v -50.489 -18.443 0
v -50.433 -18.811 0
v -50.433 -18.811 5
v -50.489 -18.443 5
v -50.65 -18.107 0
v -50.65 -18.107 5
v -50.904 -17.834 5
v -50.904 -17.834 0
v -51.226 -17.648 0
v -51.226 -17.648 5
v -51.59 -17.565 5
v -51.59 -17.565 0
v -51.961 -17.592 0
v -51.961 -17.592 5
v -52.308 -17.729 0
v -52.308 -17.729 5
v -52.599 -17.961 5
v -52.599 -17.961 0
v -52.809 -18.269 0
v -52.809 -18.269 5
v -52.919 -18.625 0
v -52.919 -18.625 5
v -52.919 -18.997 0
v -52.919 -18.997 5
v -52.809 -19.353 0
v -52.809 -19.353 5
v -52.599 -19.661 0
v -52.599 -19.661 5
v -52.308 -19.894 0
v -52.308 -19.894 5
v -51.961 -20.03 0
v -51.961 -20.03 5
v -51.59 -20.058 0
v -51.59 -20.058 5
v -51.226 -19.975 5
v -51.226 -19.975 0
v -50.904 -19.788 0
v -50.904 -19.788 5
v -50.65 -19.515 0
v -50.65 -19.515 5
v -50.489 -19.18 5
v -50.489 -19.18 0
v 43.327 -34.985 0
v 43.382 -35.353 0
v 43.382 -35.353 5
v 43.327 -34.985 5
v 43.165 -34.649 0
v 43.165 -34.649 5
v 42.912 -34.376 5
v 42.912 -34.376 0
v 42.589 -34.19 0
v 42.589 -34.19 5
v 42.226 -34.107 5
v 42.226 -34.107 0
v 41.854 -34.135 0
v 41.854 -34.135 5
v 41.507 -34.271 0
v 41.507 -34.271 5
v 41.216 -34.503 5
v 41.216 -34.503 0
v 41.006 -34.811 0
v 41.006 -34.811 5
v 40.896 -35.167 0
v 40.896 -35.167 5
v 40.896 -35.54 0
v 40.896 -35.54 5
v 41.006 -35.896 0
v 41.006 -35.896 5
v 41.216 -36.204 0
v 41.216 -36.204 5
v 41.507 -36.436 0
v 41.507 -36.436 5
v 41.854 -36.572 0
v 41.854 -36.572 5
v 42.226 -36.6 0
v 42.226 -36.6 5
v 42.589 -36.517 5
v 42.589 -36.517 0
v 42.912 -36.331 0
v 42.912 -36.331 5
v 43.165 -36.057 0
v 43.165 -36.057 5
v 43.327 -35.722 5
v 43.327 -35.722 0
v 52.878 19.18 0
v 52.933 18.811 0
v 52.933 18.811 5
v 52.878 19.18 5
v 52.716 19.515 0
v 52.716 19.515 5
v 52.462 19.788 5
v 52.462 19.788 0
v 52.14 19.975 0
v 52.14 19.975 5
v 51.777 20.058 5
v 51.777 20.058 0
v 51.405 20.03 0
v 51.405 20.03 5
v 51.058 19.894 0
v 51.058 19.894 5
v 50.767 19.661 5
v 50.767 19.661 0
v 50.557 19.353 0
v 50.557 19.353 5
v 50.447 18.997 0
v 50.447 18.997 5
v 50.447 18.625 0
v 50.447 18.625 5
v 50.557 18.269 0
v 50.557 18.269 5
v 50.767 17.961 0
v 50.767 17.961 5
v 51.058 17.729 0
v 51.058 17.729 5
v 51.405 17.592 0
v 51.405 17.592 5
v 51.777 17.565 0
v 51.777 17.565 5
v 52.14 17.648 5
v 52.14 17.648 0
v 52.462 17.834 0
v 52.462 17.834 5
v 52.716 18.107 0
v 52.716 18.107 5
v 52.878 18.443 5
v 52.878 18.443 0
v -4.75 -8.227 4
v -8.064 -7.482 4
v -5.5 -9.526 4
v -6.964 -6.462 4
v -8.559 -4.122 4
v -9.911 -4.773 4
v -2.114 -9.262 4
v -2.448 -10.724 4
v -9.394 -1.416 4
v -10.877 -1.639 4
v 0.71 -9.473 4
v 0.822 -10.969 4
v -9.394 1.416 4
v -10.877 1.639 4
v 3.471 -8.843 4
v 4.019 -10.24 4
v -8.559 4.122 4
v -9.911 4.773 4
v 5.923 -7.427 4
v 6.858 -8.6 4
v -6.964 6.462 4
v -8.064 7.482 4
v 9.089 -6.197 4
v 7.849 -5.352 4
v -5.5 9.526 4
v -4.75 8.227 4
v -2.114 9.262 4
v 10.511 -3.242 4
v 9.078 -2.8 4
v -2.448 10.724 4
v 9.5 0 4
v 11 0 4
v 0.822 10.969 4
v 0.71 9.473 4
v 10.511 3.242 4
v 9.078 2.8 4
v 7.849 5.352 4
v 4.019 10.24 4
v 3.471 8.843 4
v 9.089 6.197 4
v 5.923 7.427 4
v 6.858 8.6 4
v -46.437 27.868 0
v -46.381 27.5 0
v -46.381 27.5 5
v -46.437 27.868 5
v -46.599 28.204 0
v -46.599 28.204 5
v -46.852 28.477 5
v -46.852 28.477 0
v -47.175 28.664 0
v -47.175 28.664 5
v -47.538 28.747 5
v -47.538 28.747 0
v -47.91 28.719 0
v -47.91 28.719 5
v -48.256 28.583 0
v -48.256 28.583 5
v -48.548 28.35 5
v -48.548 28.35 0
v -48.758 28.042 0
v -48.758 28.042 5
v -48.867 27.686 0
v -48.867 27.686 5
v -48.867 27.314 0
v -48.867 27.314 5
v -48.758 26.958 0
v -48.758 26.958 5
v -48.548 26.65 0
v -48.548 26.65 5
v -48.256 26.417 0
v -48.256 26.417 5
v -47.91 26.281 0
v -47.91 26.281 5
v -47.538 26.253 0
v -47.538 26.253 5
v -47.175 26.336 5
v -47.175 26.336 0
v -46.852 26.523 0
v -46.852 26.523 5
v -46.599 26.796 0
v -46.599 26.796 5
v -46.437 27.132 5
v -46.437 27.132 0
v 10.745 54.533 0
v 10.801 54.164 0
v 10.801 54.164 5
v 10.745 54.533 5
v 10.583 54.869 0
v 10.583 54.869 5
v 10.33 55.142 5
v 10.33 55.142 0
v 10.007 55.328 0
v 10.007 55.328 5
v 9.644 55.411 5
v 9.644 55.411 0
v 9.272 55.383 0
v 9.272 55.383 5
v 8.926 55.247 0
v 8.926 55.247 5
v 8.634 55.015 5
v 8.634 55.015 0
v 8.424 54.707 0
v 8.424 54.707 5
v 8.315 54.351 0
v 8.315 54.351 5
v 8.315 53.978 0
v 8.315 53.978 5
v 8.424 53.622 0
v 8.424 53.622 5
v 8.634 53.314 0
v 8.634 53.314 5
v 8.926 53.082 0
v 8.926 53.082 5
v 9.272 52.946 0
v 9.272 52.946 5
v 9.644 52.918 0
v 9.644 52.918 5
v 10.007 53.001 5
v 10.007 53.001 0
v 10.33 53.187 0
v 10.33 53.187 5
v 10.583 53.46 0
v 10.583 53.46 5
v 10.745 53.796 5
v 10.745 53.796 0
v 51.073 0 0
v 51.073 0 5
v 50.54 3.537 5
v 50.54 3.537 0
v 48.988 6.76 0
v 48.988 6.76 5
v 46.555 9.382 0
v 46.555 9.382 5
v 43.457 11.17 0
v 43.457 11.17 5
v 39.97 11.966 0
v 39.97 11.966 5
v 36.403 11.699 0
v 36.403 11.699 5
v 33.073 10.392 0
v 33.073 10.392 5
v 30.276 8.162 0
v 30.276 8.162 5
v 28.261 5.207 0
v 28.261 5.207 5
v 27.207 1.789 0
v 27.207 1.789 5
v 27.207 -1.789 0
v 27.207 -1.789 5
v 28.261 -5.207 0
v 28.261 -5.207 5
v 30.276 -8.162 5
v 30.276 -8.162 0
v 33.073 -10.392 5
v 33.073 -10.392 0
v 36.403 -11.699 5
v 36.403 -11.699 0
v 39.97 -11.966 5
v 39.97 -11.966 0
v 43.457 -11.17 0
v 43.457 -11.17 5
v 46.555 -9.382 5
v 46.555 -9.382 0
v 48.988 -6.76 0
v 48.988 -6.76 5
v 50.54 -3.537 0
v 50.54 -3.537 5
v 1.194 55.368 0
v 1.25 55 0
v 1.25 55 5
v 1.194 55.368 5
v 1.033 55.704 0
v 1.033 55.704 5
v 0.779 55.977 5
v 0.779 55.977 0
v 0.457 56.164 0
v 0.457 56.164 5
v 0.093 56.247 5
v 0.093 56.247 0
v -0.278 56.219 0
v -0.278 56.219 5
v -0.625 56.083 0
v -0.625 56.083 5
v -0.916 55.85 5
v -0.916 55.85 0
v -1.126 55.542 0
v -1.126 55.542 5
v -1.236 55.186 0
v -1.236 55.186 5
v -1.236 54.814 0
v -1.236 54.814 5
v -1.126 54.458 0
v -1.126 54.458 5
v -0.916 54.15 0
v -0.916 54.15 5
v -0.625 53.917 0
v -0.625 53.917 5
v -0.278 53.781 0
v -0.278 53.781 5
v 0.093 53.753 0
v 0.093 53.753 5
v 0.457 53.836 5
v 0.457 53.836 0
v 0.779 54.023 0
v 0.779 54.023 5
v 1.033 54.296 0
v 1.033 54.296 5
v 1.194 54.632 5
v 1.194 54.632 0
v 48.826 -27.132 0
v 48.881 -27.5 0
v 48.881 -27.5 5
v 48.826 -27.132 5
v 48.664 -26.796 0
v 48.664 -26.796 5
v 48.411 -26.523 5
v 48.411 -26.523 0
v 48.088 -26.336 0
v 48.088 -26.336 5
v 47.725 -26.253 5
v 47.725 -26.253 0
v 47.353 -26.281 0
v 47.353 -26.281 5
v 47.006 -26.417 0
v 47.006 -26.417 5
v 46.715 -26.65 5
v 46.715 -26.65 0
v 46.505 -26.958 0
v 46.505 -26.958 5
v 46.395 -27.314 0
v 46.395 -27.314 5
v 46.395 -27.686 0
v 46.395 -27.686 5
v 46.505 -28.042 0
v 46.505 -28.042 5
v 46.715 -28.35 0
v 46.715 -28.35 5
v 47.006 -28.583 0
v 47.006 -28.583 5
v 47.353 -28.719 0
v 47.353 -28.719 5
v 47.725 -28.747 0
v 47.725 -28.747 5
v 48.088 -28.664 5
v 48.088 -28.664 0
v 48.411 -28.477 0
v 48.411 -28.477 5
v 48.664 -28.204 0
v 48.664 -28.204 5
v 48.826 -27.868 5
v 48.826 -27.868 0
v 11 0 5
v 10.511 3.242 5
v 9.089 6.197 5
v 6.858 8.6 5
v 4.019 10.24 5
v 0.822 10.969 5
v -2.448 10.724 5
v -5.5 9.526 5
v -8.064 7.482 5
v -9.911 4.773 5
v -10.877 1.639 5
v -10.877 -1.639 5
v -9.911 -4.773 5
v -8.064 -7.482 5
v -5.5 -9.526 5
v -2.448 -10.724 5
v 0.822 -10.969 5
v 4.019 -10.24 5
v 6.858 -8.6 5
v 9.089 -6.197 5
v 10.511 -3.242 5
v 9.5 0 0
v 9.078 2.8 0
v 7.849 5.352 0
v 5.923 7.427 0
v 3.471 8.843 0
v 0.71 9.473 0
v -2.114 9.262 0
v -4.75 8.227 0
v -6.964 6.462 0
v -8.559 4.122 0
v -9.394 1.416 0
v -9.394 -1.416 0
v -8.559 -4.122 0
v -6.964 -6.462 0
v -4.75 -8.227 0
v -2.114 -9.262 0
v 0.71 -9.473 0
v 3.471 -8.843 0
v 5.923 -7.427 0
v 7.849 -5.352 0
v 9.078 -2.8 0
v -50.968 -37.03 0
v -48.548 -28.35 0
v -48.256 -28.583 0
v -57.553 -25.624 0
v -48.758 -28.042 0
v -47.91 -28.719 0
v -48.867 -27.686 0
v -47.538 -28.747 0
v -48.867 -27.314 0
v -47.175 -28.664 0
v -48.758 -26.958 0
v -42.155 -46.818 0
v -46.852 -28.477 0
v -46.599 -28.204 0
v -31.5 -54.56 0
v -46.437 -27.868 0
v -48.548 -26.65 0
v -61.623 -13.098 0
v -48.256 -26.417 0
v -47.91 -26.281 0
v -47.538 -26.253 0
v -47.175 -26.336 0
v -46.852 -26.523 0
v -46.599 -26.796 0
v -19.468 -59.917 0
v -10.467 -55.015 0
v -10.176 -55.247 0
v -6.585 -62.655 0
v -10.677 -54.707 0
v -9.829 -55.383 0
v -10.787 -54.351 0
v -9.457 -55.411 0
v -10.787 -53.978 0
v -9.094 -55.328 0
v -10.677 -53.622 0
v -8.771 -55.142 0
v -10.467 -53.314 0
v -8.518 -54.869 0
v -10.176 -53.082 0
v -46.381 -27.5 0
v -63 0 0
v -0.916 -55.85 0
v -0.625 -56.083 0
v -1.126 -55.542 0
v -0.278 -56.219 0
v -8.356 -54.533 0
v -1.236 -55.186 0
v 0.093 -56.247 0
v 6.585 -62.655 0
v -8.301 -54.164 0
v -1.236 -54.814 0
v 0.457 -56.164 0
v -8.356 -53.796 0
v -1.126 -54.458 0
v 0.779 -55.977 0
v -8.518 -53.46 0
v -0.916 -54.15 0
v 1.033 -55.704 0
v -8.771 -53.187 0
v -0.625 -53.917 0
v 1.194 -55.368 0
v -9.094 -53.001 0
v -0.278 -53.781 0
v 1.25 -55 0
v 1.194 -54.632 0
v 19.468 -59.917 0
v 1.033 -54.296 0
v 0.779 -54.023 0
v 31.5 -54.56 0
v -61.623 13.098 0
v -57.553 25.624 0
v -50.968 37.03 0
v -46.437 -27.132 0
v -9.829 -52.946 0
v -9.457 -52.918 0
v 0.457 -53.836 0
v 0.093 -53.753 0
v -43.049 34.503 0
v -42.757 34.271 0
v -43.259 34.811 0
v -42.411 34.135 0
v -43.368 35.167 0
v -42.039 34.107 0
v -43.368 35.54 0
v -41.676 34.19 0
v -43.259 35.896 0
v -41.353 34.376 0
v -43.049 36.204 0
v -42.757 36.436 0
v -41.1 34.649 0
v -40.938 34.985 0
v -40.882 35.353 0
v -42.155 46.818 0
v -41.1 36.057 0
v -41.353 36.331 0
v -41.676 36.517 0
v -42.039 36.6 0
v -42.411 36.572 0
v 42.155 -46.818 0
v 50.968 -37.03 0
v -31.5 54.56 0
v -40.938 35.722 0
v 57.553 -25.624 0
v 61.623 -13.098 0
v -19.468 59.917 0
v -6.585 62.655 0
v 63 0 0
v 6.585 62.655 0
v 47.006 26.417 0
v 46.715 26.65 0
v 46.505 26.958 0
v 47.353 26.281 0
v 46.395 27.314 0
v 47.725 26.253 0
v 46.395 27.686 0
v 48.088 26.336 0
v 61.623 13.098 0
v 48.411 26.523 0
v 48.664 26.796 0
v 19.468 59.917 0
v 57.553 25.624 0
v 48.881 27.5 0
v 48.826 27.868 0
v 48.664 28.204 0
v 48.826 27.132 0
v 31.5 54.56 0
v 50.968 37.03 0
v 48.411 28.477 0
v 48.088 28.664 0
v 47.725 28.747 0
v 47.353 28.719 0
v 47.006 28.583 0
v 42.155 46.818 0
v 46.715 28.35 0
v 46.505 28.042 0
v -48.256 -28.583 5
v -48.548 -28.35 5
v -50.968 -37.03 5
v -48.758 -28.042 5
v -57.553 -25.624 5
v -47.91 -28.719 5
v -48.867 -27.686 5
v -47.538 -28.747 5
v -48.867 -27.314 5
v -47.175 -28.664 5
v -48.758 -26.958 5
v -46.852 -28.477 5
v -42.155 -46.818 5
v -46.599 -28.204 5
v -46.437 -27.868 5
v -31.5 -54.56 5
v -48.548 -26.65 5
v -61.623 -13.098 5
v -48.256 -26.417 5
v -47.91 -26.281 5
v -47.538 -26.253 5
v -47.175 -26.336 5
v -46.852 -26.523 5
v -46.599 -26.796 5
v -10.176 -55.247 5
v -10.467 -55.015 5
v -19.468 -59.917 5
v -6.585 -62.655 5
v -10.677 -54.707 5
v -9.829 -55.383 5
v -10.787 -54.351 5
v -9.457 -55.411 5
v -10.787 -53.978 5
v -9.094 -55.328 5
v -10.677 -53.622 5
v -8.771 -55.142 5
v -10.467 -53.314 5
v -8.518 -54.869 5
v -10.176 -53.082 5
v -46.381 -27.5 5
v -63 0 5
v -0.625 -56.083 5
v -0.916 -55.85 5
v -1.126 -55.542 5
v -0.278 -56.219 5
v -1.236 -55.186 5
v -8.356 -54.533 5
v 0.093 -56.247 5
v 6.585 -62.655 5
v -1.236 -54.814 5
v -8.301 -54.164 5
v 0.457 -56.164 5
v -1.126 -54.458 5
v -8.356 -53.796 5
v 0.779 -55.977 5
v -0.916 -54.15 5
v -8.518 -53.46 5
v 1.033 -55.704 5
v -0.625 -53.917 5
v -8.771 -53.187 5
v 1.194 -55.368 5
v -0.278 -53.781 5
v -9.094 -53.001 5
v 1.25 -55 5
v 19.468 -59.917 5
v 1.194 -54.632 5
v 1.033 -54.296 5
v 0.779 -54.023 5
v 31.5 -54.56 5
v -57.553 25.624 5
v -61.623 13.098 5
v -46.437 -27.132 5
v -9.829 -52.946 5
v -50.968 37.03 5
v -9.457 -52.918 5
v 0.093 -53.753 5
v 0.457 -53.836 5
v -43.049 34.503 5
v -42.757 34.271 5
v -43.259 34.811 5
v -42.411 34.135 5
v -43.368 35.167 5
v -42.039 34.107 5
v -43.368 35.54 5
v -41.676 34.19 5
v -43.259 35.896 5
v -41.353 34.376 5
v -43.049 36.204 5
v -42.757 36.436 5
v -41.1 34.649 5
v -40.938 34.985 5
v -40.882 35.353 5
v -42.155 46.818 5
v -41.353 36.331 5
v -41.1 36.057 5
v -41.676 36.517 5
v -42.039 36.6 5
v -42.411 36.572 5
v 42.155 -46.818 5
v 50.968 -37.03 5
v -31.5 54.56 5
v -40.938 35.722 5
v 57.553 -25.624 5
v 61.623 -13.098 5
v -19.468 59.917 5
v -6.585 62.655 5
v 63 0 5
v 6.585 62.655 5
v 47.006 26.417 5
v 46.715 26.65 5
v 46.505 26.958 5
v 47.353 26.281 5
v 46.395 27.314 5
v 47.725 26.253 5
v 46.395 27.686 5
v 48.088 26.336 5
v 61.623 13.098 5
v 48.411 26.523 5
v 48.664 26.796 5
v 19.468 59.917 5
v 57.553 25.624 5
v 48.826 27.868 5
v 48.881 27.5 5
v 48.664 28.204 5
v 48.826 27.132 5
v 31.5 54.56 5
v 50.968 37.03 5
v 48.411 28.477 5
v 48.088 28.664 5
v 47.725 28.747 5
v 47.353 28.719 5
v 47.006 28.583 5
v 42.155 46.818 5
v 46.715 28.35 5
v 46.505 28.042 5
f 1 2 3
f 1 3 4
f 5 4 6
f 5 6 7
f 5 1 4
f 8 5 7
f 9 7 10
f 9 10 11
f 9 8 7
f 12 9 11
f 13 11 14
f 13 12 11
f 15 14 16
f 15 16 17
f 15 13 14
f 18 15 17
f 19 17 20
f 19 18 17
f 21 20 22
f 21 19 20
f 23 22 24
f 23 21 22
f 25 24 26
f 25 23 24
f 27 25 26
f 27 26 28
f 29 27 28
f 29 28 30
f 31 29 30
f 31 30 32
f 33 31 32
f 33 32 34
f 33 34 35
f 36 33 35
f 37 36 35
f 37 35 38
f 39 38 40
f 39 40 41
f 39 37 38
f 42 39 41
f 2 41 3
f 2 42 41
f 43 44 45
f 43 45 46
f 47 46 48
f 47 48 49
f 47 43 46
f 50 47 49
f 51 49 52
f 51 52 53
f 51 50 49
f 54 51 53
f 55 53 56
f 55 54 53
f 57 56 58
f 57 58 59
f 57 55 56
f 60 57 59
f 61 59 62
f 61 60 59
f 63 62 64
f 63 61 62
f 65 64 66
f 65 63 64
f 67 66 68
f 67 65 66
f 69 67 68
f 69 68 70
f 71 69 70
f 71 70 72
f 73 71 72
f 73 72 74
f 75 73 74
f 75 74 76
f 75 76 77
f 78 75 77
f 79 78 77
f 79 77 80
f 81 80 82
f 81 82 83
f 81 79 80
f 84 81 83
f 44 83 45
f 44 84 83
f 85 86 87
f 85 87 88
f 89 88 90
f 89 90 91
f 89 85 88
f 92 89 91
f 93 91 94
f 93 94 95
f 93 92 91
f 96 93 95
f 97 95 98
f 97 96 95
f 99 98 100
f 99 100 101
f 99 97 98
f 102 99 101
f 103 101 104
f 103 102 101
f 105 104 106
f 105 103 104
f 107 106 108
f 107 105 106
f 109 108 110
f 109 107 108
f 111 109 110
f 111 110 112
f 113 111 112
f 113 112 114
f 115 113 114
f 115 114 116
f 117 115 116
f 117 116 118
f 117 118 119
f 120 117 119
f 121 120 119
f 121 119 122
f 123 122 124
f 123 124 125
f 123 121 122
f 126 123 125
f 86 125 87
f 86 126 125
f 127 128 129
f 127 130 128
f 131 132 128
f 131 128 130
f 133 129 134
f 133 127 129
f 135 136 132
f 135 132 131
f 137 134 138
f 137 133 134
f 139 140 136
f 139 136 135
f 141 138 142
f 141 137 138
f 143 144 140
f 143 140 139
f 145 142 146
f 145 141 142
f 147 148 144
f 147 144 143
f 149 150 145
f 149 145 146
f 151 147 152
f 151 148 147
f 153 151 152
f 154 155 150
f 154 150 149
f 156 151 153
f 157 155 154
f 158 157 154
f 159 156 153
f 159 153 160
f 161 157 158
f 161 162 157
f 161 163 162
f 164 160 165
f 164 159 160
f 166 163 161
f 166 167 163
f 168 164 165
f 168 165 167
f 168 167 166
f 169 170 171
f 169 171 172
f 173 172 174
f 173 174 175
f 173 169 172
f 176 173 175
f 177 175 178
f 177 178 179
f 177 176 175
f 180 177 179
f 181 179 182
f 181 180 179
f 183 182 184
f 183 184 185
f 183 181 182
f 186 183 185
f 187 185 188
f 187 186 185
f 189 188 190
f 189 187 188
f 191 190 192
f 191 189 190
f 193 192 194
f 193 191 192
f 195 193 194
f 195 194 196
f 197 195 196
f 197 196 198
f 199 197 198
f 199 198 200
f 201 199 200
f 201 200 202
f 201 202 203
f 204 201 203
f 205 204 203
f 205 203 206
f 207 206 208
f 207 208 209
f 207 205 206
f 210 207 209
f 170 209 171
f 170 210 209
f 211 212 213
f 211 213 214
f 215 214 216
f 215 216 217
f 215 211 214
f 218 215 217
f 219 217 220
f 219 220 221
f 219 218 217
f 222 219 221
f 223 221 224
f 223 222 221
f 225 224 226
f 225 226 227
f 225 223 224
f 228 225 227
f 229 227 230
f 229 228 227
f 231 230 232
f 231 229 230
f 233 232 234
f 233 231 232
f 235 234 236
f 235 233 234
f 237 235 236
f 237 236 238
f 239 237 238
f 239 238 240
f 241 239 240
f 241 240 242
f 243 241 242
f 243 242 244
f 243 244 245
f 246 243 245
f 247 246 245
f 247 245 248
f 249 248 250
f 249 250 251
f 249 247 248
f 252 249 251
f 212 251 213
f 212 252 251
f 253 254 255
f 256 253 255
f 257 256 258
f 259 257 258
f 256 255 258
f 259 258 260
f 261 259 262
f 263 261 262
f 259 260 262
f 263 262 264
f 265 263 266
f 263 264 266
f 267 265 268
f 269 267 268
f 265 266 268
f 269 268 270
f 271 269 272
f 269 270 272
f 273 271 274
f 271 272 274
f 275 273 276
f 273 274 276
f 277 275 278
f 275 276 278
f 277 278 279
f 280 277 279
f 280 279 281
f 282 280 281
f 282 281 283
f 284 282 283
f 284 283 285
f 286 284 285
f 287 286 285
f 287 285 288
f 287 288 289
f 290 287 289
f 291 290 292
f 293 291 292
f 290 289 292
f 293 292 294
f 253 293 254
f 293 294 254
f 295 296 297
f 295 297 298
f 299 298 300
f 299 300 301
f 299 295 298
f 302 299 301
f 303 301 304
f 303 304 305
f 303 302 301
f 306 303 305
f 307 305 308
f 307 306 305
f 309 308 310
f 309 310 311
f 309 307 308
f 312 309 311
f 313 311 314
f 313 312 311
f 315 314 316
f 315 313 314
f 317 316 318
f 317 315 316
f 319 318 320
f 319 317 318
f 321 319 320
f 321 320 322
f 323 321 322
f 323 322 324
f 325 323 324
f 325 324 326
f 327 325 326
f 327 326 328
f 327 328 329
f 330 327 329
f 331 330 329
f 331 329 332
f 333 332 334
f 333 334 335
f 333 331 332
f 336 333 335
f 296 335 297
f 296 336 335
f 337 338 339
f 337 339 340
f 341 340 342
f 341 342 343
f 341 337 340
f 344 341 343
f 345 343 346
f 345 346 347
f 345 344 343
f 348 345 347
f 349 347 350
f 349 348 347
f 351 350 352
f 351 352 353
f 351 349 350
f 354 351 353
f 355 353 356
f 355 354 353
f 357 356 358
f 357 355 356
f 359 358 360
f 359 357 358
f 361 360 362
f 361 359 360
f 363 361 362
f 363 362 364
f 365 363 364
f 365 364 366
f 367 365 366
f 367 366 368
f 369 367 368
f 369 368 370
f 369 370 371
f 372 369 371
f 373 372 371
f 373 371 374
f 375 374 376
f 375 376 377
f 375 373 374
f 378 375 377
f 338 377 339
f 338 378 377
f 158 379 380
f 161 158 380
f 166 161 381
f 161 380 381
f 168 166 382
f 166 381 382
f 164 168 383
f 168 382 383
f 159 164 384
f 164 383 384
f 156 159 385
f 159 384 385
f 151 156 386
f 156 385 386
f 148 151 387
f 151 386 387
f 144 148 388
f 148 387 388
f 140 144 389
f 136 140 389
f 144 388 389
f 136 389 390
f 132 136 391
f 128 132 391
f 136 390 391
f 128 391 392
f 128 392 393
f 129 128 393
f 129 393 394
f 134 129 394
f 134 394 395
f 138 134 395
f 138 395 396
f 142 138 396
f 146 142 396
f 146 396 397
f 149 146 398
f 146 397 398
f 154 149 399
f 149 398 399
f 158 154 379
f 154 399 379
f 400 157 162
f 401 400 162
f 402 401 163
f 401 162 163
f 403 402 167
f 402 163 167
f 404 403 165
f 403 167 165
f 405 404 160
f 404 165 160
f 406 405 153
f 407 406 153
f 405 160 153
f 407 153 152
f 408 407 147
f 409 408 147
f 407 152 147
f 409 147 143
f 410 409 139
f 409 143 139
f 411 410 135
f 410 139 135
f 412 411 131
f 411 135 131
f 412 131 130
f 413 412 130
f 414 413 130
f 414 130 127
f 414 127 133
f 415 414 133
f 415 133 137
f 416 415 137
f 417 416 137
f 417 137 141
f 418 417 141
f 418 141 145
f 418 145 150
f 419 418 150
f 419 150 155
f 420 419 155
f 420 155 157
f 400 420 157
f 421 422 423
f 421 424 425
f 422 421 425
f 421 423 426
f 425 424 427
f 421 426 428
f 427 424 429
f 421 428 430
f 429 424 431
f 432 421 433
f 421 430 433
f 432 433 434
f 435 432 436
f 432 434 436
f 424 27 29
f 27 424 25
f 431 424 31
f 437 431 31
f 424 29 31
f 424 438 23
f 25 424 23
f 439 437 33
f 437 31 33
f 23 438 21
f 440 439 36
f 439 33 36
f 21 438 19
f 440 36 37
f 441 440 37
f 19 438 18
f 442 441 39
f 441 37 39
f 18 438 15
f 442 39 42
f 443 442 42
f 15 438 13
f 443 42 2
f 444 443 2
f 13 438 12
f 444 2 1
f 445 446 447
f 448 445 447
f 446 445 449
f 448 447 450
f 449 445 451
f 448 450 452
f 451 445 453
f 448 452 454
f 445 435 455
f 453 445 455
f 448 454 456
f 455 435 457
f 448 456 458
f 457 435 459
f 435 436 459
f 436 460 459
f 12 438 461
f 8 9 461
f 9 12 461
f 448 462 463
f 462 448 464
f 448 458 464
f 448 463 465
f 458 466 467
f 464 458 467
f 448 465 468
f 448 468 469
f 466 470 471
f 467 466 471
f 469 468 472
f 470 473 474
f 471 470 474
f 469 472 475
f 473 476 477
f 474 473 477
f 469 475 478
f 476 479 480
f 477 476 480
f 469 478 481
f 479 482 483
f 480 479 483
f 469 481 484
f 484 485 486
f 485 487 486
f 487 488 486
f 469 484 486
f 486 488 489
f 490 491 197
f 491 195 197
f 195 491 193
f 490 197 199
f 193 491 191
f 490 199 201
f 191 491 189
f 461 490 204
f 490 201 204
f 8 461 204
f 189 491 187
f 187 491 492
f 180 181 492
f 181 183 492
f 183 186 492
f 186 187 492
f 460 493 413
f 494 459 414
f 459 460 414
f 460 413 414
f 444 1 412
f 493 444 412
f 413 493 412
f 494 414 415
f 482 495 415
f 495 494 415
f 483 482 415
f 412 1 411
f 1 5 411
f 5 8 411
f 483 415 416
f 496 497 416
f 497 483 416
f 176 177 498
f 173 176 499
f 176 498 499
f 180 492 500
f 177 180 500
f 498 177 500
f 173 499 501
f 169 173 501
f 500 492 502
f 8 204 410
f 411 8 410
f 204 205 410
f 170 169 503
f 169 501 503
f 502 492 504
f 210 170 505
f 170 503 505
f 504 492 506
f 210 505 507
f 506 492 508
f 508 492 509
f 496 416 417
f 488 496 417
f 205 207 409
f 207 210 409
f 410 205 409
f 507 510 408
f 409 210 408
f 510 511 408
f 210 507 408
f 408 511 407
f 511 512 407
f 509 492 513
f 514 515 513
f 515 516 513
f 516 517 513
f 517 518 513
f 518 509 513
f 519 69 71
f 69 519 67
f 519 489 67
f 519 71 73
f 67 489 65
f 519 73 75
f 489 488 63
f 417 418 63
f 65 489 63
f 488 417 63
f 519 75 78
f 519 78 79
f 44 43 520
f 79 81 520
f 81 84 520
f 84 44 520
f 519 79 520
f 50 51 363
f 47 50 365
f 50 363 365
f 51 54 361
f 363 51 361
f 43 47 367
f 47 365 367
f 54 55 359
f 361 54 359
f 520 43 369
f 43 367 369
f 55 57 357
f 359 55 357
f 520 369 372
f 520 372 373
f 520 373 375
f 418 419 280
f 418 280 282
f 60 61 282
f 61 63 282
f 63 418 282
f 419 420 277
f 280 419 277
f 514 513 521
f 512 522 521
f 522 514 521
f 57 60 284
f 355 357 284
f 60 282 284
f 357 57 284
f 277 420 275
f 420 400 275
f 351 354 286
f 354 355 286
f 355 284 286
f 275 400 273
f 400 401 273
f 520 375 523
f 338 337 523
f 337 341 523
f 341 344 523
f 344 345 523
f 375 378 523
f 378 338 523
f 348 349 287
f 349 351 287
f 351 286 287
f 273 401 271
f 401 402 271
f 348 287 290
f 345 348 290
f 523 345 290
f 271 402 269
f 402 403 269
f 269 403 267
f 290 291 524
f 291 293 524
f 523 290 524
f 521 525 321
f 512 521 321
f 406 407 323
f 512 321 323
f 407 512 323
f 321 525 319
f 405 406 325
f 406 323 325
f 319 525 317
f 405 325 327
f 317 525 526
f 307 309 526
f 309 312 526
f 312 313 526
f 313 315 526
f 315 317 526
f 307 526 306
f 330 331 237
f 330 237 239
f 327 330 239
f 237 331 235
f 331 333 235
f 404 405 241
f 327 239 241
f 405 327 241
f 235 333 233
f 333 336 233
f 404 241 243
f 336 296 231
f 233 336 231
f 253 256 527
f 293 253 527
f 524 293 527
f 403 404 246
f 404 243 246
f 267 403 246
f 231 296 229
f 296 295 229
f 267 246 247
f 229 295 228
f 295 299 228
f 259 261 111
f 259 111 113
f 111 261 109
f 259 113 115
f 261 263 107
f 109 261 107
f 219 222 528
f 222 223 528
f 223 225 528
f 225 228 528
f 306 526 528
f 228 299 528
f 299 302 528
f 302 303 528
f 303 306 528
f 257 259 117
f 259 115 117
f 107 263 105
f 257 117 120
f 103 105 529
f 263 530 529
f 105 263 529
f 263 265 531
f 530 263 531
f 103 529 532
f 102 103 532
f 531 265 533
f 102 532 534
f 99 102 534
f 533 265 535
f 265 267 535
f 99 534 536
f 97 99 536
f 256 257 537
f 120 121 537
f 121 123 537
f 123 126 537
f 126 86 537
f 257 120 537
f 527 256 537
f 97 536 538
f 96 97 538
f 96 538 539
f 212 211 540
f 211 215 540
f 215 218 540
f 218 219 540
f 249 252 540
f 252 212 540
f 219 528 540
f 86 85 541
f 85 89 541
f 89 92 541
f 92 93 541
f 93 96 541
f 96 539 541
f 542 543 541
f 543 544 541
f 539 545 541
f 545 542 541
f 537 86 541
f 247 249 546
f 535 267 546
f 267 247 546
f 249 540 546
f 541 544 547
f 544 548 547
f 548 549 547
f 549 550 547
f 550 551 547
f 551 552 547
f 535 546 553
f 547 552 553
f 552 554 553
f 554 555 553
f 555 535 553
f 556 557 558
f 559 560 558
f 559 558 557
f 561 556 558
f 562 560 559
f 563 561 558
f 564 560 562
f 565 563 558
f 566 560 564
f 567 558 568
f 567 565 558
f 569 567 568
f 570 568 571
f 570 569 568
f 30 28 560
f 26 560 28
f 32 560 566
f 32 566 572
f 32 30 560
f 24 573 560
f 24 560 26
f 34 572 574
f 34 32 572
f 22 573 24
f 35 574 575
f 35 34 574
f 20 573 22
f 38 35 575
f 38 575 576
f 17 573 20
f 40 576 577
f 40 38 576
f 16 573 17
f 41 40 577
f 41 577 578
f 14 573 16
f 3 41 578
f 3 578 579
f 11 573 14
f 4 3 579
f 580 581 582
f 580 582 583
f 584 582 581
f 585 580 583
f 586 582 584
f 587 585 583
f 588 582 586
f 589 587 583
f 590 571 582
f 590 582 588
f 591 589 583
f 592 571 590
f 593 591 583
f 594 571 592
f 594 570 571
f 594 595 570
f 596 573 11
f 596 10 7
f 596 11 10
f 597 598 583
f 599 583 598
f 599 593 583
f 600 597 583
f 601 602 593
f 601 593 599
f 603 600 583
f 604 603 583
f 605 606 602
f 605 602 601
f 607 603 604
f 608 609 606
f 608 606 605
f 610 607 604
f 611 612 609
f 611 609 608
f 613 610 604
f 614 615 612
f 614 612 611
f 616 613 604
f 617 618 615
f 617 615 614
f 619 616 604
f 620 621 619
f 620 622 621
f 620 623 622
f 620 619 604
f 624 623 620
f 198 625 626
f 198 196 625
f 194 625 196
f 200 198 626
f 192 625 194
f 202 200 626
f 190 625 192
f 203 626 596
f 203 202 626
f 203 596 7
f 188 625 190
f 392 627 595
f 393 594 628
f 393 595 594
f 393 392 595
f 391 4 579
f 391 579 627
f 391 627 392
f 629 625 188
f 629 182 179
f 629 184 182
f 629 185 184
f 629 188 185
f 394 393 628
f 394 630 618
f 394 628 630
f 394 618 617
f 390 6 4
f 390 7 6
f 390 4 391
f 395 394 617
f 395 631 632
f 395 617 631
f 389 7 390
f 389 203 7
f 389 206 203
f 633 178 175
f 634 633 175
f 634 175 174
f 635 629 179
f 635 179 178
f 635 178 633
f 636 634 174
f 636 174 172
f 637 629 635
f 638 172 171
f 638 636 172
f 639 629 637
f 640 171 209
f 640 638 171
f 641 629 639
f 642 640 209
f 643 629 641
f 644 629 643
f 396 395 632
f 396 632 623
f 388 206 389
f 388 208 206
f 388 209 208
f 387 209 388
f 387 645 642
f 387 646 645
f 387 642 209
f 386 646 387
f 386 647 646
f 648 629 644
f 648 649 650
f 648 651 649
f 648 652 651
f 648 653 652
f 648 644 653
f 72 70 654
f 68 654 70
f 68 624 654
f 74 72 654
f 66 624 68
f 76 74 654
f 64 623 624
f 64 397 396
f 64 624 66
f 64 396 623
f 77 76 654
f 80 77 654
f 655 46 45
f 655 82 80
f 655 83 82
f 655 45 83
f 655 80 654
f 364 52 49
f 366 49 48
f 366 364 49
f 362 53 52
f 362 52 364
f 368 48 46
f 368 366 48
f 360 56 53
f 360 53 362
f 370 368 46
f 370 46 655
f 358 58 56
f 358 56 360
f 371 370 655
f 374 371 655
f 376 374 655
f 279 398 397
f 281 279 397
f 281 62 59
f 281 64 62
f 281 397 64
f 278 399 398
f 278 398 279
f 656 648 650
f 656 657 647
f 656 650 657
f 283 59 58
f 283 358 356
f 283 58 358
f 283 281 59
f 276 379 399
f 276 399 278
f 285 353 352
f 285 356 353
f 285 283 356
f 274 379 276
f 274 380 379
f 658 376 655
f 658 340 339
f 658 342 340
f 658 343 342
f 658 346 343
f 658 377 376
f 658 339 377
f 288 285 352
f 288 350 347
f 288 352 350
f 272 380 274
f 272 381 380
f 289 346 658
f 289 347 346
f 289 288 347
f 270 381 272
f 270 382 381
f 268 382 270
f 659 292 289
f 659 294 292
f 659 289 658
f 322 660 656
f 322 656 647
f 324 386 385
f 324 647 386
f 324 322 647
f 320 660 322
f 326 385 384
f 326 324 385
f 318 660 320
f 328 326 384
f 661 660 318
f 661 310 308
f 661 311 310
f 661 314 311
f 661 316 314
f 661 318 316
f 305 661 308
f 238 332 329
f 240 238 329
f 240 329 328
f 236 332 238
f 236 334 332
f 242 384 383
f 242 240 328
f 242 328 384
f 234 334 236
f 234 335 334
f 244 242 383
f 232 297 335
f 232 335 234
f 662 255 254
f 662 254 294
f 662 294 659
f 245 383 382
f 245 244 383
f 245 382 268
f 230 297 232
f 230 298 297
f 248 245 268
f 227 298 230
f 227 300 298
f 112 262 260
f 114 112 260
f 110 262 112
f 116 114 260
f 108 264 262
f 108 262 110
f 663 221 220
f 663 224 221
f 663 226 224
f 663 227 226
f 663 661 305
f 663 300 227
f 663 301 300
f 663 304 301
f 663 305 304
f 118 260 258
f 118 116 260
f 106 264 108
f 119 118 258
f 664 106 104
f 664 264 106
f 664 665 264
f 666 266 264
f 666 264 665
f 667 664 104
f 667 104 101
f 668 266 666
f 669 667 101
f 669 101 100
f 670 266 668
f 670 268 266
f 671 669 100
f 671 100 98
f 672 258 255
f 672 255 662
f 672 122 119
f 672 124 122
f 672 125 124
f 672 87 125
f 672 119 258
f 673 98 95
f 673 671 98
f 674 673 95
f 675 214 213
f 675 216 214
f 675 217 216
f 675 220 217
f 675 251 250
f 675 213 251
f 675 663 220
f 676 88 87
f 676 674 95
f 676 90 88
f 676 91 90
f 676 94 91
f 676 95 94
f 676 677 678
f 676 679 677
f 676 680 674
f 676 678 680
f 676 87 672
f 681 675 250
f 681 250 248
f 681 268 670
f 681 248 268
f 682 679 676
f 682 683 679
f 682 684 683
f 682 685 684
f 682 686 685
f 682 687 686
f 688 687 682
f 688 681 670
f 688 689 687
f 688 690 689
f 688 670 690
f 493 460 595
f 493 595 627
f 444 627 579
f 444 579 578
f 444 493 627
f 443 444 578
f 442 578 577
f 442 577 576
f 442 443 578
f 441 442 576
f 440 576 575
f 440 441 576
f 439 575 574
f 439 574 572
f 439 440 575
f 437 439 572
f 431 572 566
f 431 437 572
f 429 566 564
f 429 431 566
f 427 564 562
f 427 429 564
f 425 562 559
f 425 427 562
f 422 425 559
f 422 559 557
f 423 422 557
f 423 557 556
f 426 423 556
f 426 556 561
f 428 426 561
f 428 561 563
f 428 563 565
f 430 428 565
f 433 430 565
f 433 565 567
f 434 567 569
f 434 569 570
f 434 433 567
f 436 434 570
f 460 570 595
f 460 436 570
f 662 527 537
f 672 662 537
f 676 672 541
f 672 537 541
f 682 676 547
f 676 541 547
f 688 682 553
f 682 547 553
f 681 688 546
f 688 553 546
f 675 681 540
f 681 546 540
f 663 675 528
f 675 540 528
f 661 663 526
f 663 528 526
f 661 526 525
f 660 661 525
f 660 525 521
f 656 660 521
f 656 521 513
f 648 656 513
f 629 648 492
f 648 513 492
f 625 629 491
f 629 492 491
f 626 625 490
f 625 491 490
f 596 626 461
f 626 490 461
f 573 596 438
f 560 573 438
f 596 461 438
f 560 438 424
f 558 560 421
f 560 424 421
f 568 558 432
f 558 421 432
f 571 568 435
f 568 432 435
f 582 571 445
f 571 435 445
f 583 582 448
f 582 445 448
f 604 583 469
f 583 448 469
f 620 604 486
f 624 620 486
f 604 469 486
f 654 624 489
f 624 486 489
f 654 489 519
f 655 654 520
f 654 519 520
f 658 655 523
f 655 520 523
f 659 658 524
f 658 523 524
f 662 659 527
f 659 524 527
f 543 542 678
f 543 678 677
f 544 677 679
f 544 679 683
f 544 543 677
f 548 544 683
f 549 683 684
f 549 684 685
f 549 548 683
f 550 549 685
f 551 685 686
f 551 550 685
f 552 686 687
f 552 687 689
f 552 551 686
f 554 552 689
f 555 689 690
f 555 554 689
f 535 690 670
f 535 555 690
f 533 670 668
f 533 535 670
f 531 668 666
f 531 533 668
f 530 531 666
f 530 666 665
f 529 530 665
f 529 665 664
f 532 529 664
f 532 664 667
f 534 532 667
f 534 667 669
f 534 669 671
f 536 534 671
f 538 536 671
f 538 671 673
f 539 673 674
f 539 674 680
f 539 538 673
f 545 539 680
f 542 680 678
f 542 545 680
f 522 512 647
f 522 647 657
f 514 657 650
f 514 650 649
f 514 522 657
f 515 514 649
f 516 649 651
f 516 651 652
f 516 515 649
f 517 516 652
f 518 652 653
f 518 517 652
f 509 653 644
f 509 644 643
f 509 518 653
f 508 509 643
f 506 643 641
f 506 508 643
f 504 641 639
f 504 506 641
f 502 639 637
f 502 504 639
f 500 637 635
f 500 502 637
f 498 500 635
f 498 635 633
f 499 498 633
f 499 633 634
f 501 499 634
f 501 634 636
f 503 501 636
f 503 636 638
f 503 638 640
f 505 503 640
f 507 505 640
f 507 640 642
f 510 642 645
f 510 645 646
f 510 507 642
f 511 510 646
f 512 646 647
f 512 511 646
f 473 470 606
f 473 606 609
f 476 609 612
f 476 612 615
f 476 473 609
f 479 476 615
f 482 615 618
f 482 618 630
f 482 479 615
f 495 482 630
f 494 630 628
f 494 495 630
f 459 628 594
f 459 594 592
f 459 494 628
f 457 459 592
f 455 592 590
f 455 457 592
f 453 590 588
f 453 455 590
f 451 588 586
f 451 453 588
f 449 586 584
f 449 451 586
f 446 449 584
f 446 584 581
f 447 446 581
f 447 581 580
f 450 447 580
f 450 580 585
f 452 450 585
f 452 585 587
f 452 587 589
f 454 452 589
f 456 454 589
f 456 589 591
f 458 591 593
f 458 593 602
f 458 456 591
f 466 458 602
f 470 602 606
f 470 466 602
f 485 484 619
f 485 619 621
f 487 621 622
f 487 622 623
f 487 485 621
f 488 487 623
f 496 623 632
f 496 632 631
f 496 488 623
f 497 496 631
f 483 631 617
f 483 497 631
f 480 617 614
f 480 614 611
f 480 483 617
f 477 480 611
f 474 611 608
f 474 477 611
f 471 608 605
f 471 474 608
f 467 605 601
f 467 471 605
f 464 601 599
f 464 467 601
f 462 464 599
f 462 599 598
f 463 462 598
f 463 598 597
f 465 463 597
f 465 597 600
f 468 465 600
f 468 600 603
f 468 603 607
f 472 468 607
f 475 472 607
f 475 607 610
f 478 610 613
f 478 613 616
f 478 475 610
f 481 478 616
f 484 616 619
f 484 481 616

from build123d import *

# Parameters (mm, degrees)
SKETCH_1_R          = 63
SKETCH_1_R_2        = 1.25
EXTRUDE_1_DEPTH     = 5
SKETCH_2_R          = 12
CUT_EXTRUDE_4_DEPTH = 5
SKETCH_3_R          = 9.5
CUT_EXTRUDE_5_DEPTH = 10
SKETCH_4_R          = 11
CUT_EXTRUDE_6_DEPTH = 1


with BuildPart() as part:
    # 草图1 → 凸台-拉伸1 (new body)
    with BuildSketch(Plane.XY):
        Circle(SKETCH_1_R)
        with Locations((0, 55)):
            Circle(SKETCH_1_R_2, mode=Mode.SUBTRACT)
        with Locations((47.631397208, 27.5)):
            Circle(SKETCH_1_R_2, mode=Mode.SUBTRACT)
        with Locations((47.631397208, -27.5)):
            Circle(SKETCH_1_R_2, mode=Mode.SUBTRACT)
        with Locations((0, -55)):
            Circle(SKETCH_1_R_2, mode=Mode.SUBTRACT)
        with Locations((-47.631397208, -27.5)):
            Circle(SKETCH_1_R_2, mode=Mode.SUBTRACT)
        with Locations((-47.631397208, 27.5)):
            Circle(SKETCH_1_R_2, mode=Mode.SUBTRACT)
        with Locations((-42.132444372, 35.353318533)):
            Circle(SKETCH_1_R_2, mode=Mode.SUBTRACT)
        with Locations((9.550649772, 54.164426416)):
            Circle(SKETCH_1_R_2, mode=Mode.SUBTRACT)
        with Locations((51.683094143, 18.811107883)):
            Circle(SKETCH_1_R_2, mode=Mode.SUBTRACT)
        with Locations((42.132444372, -35.353318533)):
            Circle(SKETCH_1_R_2, mode=Mode.SUBTRACT)
        with Locations((-9.550649772, -54.164426416)):
            Circle(SKETCH_1_R_2, mode=Mode.SUBTRACT)
        with Locations((-51.683094143, -18.811107883)):
            Circle(SKETCH_1_R_2, mode=Mode.SUBTRACT)
    extrude(amount=EXTRUDE_1_DEPTH)

    # 草图2 → 切除-拉伸4 (cut)
    with BuildSketch(Plane.XY.offset(5)):
        with Locations((39.073033019, 0)):
            Circle(SKETCH_2_R)
    extrude(amount=-CUT_EXTRUDE_4_DEPTH, mode=Mode.SUBTRACT)

    # 草图3 → 切除-拉伸5 (cut)
    with BuildSketch(Plane.XY.offset(5)):
        Circle(SKETCH_3_R)
    extrude(amount=-CUT_EXTRUDE_5_DEPTH, mode=Mode.SUBTRACT)

    # 草图4 → 切除-拉伸6 (cut)
    with BuildSketch(Plane.XY.offset(5)):
        Circle(SKETCH_4_R)
    extrude(amount=-CUT_EXTRUDE_6_DEPTH, mode=Mode.SUBTRACT)


solid = part.part
